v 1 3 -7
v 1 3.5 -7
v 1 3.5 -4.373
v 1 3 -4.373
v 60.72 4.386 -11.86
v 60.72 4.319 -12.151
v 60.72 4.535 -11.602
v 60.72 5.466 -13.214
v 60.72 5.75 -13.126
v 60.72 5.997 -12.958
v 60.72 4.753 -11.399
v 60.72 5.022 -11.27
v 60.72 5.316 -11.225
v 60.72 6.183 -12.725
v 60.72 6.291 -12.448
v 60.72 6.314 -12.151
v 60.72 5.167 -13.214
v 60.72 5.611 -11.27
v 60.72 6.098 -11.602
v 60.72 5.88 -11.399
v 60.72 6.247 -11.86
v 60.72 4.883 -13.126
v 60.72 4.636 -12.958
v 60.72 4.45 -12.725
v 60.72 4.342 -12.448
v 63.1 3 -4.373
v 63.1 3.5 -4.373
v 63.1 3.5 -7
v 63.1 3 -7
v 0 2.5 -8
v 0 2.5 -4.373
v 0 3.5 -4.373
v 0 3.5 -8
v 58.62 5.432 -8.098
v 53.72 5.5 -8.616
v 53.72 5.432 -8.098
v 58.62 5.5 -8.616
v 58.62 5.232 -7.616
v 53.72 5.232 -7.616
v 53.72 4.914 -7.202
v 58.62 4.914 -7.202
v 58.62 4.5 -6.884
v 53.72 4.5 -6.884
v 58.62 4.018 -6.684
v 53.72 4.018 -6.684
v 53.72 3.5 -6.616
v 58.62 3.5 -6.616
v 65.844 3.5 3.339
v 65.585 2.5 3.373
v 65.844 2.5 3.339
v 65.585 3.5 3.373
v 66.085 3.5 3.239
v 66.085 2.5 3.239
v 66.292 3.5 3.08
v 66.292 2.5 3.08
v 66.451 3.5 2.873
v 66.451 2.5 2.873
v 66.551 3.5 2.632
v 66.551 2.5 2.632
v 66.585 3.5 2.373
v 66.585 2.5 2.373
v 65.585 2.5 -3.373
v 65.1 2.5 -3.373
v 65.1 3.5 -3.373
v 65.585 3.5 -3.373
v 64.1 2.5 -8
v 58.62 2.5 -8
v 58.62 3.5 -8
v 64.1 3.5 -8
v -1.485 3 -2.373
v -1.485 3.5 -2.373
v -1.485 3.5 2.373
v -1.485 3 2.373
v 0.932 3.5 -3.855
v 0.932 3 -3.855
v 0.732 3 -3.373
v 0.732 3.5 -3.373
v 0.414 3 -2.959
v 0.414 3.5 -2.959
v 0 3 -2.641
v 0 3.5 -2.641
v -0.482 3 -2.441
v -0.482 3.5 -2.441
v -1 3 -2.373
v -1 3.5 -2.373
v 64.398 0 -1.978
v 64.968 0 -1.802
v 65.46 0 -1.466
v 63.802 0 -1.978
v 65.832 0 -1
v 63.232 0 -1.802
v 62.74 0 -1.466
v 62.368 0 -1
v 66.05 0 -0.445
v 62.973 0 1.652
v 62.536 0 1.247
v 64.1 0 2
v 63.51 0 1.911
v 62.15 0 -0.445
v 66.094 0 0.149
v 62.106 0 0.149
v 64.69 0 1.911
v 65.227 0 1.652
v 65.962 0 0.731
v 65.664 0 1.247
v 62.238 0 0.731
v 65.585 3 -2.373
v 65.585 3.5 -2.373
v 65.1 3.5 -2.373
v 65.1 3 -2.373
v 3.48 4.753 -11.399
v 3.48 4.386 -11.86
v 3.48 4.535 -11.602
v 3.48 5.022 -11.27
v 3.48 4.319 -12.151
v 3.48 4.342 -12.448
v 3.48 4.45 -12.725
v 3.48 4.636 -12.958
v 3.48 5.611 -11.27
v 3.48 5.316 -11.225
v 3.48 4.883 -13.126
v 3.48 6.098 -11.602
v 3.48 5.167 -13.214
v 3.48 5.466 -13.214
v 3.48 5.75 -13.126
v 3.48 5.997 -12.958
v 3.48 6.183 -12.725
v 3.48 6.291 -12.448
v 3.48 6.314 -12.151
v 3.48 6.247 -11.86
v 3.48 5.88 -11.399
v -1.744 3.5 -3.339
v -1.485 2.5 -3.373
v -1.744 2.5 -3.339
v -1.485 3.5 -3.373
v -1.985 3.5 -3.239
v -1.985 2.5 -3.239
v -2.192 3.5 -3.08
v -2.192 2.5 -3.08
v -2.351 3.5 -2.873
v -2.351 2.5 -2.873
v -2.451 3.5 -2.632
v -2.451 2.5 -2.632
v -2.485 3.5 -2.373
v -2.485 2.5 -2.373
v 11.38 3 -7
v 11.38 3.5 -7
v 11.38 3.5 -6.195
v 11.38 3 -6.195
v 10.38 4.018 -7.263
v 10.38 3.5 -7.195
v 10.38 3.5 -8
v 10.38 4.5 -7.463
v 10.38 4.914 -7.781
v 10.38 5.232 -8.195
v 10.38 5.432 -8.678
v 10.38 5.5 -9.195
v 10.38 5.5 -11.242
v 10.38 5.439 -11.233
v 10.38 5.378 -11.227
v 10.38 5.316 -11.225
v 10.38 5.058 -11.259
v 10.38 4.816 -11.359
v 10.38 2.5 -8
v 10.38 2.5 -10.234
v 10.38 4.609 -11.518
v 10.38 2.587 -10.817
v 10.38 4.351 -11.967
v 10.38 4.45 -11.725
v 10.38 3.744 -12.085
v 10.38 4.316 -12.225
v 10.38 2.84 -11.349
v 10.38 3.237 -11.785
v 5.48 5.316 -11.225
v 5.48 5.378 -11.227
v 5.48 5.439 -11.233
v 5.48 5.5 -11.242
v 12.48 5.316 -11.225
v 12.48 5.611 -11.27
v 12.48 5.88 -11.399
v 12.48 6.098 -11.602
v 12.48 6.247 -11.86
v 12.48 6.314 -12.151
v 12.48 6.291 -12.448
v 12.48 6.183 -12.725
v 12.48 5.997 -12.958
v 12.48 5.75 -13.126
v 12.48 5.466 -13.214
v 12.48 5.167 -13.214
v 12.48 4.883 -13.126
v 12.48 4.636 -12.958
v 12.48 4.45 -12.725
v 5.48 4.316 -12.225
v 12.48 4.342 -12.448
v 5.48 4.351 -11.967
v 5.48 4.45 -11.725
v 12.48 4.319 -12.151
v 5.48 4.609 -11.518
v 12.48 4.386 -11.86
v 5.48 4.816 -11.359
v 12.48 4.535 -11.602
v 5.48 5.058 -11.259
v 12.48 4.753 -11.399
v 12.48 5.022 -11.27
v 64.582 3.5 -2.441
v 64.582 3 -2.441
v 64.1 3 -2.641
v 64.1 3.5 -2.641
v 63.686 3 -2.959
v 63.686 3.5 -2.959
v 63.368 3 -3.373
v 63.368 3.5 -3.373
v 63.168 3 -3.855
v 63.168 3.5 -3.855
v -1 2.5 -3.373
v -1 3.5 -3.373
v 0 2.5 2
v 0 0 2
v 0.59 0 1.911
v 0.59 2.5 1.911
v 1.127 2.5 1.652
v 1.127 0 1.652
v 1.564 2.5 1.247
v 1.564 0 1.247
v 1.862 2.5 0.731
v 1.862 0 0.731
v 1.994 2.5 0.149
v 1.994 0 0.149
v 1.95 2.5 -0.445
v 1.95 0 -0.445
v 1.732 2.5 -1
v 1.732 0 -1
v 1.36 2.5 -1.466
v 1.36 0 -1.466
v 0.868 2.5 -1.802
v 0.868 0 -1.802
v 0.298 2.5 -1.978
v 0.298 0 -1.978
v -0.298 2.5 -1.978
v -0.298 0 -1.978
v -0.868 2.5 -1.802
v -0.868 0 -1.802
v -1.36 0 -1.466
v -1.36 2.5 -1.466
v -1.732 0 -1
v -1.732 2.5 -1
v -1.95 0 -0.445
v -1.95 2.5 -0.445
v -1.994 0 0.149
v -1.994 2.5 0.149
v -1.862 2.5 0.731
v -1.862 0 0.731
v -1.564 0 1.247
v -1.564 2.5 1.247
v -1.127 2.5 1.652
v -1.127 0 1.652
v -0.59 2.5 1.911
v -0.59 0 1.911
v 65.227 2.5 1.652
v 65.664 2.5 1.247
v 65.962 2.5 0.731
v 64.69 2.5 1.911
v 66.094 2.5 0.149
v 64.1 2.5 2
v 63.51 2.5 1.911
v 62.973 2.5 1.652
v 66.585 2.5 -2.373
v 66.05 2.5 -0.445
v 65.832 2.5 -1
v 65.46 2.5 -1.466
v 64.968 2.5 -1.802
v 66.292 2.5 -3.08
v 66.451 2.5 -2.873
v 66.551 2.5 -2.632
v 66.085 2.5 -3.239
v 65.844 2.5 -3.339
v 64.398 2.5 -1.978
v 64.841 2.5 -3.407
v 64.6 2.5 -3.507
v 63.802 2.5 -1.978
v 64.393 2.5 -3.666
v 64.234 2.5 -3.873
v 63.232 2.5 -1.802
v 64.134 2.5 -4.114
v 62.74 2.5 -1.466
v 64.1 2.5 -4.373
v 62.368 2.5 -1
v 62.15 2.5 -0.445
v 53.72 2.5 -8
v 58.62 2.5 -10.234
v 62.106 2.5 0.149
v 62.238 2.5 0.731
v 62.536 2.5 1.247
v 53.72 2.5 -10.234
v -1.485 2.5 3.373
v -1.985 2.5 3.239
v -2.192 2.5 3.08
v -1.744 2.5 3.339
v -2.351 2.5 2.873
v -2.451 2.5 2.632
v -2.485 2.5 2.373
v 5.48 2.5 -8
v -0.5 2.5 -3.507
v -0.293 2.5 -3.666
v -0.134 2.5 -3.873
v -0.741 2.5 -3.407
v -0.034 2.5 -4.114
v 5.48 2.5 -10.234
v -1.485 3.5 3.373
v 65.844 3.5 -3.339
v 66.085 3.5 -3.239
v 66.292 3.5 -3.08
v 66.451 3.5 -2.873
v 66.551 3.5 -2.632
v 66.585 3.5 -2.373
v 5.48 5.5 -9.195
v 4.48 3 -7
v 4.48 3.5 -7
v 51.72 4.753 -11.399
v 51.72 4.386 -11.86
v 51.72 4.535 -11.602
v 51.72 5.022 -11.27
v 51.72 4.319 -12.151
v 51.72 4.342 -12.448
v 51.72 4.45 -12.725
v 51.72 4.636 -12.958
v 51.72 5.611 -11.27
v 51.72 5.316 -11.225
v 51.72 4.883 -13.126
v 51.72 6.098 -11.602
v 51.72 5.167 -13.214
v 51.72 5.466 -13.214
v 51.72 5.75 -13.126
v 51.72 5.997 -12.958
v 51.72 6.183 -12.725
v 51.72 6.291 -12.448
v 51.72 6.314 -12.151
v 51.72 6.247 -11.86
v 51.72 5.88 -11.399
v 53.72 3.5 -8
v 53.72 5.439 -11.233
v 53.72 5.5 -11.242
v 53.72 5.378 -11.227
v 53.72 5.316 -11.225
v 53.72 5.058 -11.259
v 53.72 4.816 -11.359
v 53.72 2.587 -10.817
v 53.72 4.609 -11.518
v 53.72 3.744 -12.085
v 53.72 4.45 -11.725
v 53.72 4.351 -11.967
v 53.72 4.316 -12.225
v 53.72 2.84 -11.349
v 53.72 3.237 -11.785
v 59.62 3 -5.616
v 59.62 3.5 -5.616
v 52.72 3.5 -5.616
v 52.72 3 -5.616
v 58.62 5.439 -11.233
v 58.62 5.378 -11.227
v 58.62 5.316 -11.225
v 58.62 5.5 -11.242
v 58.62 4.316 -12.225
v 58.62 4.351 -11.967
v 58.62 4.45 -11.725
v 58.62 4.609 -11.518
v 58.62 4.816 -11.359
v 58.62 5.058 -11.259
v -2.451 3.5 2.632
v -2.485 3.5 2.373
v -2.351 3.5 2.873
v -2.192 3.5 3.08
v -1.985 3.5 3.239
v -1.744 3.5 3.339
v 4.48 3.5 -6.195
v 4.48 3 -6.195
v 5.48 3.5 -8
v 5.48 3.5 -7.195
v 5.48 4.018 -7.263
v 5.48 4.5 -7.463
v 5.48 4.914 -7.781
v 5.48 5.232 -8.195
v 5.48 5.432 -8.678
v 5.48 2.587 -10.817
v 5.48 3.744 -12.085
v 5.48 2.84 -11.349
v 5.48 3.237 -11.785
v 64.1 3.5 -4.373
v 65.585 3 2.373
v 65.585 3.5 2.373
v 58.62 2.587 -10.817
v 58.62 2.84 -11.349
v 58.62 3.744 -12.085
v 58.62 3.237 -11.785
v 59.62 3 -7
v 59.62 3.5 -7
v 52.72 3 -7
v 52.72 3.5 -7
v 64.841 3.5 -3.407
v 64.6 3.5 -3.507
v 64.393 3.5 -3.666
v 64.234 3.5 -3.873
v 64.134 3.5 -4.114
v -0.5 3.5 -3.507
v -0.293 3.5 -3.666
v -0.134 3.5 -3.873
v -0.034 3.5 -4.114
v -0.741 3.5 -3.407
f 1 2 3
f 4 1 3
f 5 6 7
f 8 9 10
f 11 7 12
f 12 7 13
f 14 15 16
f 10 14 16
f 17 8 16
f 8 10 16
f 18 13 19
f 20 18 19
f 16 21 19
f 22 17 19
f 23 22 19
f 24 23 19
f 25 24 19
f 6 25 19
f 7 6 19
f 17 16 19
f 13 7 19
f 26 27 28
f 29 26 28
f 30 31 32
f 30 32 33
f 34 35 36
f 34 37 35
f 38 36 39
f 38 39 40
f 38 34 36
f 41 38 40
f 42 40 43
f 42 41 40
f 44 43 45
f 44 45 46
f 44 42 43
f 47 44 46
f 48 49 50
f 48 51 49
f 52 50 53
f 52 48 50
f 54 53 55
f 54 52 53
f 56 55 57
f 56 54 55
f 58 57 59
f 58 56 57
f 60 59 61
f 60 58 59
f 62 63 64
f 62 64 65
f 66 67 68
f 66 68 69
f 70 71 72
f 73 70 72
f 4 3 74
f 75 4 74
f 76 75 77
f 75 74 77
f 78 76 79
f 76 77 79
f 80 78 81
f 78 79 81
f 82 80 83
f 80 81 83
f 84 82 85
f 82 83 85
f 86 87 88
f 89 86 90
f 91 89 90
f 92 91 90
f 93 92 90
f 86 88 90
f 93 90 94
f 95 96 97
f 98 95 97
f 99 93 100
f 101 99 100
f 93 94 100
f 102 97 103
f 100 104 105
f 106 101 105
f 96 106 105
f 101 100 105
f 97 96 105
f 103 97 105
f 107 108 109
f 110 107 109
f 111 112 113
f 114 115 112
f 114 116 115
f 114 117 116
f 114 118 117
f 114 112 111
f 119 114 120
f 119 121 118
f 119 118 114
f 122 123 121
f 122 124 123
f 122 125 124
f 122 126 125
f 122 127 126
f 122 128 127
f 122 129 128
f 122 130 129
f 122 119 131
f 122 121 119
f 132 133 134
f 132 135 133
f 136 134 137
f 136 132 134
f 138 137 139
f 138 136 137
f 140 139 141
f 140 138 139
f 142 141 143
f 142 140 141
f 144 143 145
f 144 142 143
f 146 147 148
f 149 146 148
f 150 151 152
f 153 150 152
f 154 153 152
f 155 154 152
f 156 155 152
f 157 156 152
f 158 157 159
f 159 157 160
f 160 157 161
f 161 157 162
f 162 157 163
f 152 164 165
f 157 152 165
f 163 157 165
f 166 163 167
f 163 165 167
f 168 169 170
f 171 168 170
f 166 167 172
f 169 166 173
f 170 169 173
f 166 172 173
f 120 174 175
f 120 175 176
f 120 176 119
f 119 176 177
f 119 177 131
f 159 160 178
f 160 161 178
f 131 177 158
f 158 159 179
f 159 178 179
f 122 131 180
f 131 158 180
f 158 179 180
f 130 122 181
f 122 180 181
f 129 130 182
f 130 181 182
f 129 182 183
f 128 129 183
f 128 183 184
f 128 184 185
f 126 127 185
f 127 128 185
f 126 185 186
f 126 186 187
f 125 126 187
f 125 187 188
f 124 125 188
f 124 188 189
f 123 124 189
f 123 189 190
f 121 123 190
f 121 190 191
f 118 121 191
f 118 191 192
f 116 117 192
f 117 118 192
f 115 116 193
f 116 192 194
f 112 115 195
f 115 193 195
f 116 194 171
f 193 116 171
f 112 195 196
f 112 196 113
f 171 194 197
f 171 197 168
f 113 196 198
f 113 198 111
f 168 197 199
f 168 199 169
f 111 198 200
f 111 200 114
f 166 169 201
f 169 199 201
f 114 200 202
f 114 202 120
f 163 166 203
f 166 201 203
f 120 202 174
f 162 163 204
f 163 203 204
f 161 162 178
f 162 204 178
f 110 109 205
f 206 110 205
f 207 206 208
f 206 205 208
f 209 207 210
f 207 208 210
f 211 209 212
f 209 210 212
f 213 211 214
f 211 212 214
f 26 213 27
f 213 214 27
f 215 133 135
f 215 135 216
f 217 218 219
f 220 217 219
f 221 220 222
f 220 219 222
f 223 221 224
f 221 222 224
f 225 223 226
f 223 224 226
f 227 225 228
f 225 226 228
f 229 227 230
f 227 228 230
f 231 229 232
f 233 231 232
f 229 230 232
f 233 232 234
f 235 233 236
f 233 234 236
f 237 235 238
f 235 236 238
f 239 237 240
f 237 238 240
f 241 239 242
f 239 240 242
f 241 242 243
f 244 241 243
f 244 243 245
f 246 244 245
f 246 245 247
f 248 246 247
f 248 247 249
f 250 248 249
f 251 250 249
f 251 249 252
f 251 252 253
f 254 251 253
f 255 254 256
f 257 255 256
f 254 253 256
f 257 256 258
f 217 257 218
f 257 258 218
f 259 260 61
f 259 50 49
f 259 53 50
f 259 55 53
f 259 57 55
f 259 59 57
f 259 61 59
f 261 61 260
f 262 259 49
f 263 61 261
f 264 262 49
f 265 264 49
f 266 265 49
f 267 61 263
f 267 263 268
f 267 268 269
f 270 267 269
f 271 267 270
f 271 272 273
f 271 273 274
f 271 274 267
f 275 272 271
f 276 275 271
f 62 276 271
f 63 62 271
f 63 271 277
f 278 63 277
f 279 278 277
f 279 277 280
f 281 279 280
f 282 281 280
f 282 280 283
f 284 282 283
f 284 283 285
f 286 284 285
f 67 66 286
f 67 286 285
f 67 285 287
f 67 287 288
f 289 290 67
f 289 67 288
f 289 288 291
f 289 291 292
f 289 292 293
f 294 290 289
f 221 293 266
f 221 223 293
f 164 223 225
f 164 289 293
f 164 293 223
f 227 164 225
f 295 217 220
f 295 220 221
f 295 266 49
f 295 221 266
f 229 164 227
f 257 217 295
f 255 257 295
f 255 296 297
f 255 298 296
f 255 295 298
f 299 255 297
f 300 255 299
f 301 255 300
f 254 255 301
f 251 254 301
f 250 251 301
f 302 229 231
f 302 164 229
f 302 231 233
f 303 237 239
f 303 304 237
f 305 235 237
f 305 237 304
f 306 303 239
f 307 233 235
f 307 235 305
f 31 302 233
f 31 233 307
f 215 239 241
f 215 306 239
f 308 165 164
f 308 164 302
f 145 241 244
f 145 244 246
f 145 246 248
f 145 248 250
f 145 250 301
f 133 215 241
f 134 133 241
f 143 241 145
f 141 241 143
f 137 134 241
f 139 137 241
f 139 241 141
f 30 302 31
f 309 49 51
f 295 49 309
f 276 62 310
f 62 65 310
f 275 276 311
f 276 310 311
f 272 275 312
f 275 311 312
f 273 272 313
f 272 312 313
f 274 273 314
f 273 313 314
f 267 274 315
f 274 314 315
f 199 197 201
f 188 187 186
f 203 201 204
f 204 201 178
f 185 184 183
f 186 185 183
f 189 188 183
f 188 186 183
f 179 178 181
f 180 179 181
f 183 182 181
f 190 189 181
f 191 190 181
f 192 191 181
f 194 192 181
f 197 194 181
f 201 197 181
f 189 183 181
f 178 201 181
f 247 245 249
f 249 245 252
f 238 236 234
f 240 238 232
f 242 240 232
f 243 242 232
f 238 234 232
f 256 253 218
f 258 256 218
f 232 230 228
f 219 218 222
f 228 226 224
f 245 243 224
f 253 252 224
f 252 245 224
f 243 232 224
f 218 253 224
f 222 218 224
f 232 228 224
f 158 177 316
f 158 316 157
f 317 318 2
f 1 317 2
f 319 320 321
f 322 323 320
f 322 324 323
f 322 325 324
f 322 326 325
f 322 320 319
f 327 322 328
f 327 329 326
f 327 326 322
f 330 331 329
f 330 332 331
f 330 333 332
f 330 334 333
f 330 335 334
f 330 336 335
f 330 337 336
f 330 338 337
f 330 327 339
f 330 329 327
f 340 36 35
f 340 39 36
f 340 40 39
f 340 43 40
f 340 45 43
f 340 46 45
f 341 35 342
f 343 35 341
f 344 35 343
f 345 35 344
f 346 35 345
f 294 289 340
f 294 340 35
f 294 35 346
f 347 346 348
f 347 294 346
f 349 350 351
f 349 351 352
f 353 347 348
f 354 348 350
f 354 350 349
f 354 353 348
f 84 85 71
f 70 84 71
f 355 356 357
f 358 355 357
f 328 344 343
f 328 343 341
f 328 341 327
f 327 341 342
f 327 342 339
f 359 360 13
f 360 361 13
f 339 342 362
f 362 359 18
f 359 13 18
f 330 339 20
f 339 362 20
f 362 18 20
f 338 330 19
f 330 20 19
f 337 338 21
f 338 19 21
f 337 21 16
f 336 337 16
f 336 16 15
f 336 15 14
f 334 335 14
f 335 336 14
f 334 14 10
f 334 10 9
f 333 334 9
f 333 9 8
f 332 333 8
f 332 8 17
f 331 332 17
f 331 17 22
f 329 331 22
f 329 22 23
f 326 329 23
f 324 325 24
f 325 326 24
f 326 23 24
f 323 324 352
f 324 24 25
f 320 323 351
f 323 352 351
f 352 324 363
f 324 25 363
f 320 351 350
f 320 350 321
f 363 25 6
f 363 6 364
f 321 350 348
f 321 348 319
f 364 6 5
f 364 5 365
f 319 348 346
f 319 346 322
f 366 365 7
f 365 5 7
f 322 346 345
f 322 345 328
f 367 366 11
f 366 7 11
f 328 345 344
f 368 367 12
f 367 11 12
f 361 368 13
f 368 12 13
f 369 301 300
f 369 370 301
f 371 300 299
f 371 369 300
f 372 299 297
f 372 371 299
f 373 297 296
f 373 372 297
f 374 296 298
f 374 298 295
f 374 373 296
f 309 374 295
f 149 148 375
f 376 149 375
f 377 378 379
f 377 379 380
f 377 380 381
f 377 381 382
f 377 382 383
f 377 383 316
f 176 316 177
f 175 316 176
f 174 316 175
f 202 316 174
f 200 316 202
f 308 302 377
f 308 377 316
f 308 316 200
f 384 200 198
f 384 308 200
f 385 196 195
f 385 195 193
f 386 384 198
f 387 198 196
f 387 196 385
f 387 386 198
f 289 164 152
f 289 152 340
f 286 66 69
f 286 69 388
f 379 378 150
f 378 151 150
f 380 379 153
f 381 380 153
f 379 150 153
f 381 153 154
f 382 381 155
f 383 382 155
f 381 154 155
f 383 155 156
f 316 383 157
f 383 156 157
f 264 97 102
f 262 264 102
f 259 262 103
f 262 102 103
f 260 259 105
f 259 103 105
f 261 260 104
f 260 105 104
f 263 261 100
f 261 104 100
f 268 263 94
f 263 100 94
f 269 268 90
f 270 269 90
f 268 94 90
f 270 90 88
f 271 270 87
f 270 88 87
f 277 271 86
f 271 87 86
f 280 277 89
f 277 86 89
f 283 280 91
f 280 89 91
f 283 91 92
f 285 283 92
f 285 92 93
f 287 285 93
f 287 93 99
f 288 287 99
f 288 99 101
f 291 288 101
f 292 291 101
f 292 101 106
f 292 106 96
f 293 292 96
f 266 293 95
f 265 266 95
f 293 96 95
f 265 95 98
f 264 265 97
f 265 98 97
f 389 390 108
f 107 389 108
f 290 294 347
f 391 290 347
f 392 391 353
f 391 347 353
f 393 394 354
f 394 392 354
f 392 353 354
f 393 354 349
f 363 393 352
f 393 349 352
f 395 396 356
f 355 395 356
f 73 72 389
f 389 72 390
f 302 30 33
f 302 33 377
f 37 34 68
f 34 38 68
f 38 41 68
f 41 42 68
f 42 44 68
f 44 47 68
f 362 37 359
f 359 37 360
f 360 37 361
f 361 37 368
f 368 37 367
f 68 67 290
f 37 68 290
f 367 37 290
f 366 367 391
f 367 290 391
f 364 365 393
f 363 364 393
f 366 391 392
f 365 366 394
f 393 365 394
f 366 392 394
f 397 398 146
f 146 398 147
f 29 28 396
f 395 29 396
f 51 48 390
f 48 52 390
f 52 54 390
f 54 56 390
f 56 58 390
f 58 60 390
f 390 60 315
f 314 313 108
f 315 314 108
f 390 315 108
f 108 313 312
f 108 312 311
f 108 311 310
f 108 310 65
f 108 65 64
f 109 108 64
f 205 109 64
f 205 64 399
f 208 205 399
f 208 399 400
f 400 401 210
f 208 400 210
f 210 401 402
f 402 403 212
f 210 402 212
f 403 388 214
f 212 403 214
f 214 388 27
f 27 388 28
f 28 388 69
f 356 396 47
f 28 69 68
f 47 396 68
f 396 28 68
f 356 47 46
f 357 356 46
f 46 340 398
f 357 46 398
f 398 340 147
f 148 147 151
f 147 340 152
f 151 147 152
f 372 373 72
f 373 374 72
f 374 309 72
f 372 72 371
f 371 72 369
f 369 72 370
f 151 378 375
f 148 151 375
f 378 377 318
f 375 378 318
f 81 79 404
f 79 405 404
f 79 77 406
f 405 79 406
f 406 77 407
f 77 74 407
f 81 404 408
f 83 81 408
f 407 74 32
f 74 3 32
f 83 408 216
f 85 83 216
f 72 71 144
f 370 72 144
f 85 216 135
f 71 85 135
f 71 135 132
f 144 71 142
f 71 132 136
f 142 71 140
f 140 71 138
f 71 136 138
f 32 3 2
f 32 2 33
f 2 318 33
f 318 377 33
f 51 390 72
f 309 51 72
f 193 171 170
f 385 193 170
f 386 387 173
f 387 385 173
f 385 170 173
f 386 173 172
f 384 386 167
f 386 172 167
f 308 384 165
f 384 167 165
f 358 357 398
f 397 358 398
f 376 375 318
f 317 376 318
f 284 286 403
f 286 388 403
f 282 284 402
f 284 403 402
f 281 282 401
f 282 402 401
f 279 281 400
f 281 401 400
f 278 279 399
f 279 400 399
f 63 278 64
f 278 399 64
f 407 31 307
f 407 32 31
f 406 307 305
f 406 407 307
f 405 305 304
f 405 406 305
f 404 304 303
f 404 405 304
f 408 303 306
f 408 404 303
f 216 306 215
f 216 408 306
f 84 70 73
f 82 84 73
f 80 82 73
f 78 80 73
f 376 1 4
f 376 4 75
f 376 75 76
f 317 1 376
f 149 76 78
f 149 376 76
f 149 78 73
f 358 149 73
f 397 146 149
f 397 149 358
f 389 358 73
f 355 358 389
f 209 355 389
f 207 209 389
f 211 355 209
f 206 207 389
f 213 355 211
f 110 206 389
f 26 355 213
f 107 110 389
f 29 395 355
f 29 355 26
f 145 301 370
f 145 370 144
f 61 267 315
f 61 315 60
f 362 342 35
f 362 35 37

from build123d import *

# Parameters (mm, degrees)
SKETCH1_R                = 2
BOSS_EXTRUDE1_DEPTH      = 2.5
BOSS_EXTRUDE1_2_DEPTH    = 2.5
BOSS_EXTRUDE3_DEPTH      = 1
FILLET1_R                = 1
BOSS_EXTRUDE4_DEPTH      = 2
BOSS_EXTRUDE4_DEPTH_BACK = 1
SKETCH3_W                = 4.9
SKETCH3_H                = 5.030022666
SKETCH3_H_2              = 5.609354891
BOSS_EXTRUDE5_DEPTH      = 2
BOSS_EXTRUDE5_DEPTH_BACK = 7
SKETCH4_R                = 1
BOSS_EXTRUDE6_DEPTH      = 2
BOSS_EXTRUDE6_DEPTH_BACK = 7
SKETCH5_R                = 1
FILLET2_R                = 2
FILLET3_R                = 2
CUT_EXTRUDE1_DEPTH       = 0.5
FILLET4_R                = 2


# Some blends are built 0.0001 mm under size
with BuildPart() as part:
    # Sketch1 → Boss-Extrude1 (new body)
    with BuildSketch(Plane(origin=(0, 0, 0), x_dir=(1, 0, 0), z_dir=(0, 1, 0))):
        with Locations(Location((64.1, 0, 0), (0, 0, 270))):
            Circle(SKETCH1_R)
    extrude(amount=BOSS_EXTRUDE1_DEPTH)



with BuildPart() as body_2:
    # Sketch1 → Boss-Extrude1 2 (new body)
    with BuildSketch(Plane(origin=(0, 0, 0), x_dir=(1, 0, 0), z_dir=(0, 1, 0))):
        with Locations(Location((0, 0, 0), (0, 0, 270))):
            Circle(SKETCH1_R)
    extrude(amount=BOSS_EXTRUDE1_2_DEPTH)


with BuildPart() as part_1:
    add(part.part)

    add(body_2.part)  # Boss-Extrude3 merges body 2
    # Sketch2 → Boss-Extrude3 (add)
    with BuildSketch(Plane(origin=(0, 2.5, 0), x_dir=(1, 0, 0), z_dir=(0, 1, 0))):
        Polygon((0, 3.373067478), (0, 8), (64.1, 8), (64.1, 3.373067478), (66.585371827, 3.373067478), (66.585371827, -3.373067478), (-2.485371827, -3.373067478), (-2.485371827, 3.373067478), align=None)
    extrude(amount=BOSS_EXTRUDE3_DEPTH)

    # Fillet1
    fillet1_edges = [part_1.edges().sort_by_distance(p)[0] for p in [
        (64.1, 3, -3.373067478),
        (0, 3, -3.373067478),
        (-2.485371827, 3, -3.373067478),
        (-2.485371827, 3, 3.373067478),
        (66.585371827, 3, 3.373067478),
        (66.585371827, 3, -3.373067478),
    ]]
    fillet(fillet1_edges, radius=FILLET1_R)

    # Sketch3 → Boss-Extrude4 (add, two sides: drawn at the far end of the back side and taken through both)
    with BuildSketch(Plane(origin=(0, 3.5, 0), x_dir=(1, 0, 0), z_dir=(0, 1, 0)).offset(-BOSS_EXTRUDE4_DEPTH_BACK)):
        with Locations((7.93, 9.710321272)):
            Rectangle(SKETCH3_W, SKETCH3_H)
        with Locations((56.17, 9.42065516)):
            Rectangle(SKETCH3_W, SKETCH3_H_2)
    extrude(amount=BOSS_EXTRUDE4_DEPTH + BOSS_EXTRUDE4_DEPTH_BACK)

    # Sketch4 → Boss-Extrude5 (add, two sides: drawn at the far end of the back side and taken through both)
    with BuildSketch(Plane.ZY.offset(-5.48).offset(-BOSS_EXTRUDE5_DEPTH_BACK)):
        with Locations((-12.225332605, 5.316497078)):
            Circle(SKETCH4_R)
    extrude(amount=BOSS_EXTRUDE5_DEPTH + BOSS_EXTRUDE5_DEPTH_BACK)

    # Sketch5 → Boss-Extrude6 (add, two sides: drawn at the far end of the back side and taken through both)
    with BuildSketch(Plane.ZY.offset(-53.72).offset(-BOSS_EXTRUDE6_DEPTH_BACK)):
        with Locations((-12.225332605, 5.316497078)):
            Circle(SKETCH5_R)
    extrude(amount=BOSS_EXTRUDE6_DEPTH + BOSS_EXTRUDE6_DEPTH_BACK)

    # Fillet2
    fillet2_edges = [part_1.edges().sort_by_distance(p)[0] for p in [
        (56.17, 5.5, -6.615977714),
        (7.93, 5.5, -7.195309939),
    ]]
    fillet(fillet2_edges, radius=FILLET2_R - 0.0001)  # a hair under: the kernel refuses the full size

    # Fillet3
    # the kernel refuses this fillet: 2 mm, written as the material it takes off along each edge
    with BuildSketch(Plane(origin=(48.741090307, 2.5, -12.225332605), x_dir=(0, 0, 1), z_dir=(1, 0, 0))) as fillet3_piece_1:
        with BuildLine():
            CenterArc((1.991563877, -2), FILLET3_R, 90, 84.735624625)
            Line((0, -1.816497078), (-0.039831278, -1.81282702))
            ThreePointArc((-0.039831278, -1.81282702), (-0.04, -0.908248539), (-0.04, 0))
            Line((-0.04, 0), (0, 0.04))
            Line((0, 0.04), (1.991563877, 0.04))
            Line((1.991563877, 0.04), (1.991563877, 0))
        make_face()
    extrude(amount=14.857819387, mode=Mode.SUBTRACT)

    # Sketch6 → Cut-Extrude1 (cut)
    with BuildSketch(Plane(origin=(0, 3.5, 0), x_dir=(1, 0, 0), z_dir=(0, 1, 0))):
        with BuildLine():
            Line((59.62, 5.615977714), (52.72, 5.615977714))
            Line((52.72, 5.615977714), (52.72, 7))
            Line((52.72, 7), (11.38, 7))
            Line((11.38, 7), (11.38, 6.195309939))
            Line((11.38, 6.195309939), (4.48, 6.195309939))
            Line((4.48, 6.195309939), (4.48, 7))
            Line((4.48, 7), (1, 7))
            Line((1, 7), (1, 4.373067478))
            ThreePointArc((1, 4.373067478), (0.414213562, 2.958853916), (-1, 2.373067478))
            Line((-1, 2.373067478), (-1.485371827, 2.373067478))
            Line((-1.485371827, 2.373067478), (-1.485371827, -2.373067478))
            Line((-1.485371827, -2.373067478), (65.585371827, -2.373067478))
            Line((65.585371827, -2.373067478), (65.585371827, 2.373067478))
            Line((65.585371827, 2.373067478), (65.1, 2.373067478))
            ThreePointArc((65.1, 2.373067478), (63.685786438, 2.958853916), (63.1, 4.373067478))
            Line((63.1, 4.373067478), (63.1, 7))
            Line((63.1, 7), (59.62, 7))
            Line((59.62, 7), (59.62, 5.615977714))
        make_face()
    extrude(amount=-CUT_EXTRUDE1_DEPTH, mode=Mode.SUBTRACT)

    # Fillet4
    # the kernel refuses this fillet: 2 mm, written as the material it takes off along each edge
    with BuildSketch(Plane(origin=(15.358909693, 2.5, -12.225332605), x_dir=(0, 0, 1), z_dir=(-1, 0, 0))) as fillet4_piece_1:
        with BuildLine():
            CenterArc((1.991563877, 2), FILLET4_R, 185.264375375, 84.735624625)
            Line((0, 1.816497078), (-0.039831278, 1.81282702))
            ThreePointArc((-0.039831278, 1.81282702), (-0.04, 0.908248539), (-0.04, 0))
            Line((-0.04, 0), (0, -0.04))
            Line((0, -0.04), (1.991563877, -0.04))
            Line((1.991563877, -0.04), (1.991563877, 0))
        make_face()
    extrude(amount=14.857819387, mode=Mode.SUBTRACT)


solid = part_1.part
